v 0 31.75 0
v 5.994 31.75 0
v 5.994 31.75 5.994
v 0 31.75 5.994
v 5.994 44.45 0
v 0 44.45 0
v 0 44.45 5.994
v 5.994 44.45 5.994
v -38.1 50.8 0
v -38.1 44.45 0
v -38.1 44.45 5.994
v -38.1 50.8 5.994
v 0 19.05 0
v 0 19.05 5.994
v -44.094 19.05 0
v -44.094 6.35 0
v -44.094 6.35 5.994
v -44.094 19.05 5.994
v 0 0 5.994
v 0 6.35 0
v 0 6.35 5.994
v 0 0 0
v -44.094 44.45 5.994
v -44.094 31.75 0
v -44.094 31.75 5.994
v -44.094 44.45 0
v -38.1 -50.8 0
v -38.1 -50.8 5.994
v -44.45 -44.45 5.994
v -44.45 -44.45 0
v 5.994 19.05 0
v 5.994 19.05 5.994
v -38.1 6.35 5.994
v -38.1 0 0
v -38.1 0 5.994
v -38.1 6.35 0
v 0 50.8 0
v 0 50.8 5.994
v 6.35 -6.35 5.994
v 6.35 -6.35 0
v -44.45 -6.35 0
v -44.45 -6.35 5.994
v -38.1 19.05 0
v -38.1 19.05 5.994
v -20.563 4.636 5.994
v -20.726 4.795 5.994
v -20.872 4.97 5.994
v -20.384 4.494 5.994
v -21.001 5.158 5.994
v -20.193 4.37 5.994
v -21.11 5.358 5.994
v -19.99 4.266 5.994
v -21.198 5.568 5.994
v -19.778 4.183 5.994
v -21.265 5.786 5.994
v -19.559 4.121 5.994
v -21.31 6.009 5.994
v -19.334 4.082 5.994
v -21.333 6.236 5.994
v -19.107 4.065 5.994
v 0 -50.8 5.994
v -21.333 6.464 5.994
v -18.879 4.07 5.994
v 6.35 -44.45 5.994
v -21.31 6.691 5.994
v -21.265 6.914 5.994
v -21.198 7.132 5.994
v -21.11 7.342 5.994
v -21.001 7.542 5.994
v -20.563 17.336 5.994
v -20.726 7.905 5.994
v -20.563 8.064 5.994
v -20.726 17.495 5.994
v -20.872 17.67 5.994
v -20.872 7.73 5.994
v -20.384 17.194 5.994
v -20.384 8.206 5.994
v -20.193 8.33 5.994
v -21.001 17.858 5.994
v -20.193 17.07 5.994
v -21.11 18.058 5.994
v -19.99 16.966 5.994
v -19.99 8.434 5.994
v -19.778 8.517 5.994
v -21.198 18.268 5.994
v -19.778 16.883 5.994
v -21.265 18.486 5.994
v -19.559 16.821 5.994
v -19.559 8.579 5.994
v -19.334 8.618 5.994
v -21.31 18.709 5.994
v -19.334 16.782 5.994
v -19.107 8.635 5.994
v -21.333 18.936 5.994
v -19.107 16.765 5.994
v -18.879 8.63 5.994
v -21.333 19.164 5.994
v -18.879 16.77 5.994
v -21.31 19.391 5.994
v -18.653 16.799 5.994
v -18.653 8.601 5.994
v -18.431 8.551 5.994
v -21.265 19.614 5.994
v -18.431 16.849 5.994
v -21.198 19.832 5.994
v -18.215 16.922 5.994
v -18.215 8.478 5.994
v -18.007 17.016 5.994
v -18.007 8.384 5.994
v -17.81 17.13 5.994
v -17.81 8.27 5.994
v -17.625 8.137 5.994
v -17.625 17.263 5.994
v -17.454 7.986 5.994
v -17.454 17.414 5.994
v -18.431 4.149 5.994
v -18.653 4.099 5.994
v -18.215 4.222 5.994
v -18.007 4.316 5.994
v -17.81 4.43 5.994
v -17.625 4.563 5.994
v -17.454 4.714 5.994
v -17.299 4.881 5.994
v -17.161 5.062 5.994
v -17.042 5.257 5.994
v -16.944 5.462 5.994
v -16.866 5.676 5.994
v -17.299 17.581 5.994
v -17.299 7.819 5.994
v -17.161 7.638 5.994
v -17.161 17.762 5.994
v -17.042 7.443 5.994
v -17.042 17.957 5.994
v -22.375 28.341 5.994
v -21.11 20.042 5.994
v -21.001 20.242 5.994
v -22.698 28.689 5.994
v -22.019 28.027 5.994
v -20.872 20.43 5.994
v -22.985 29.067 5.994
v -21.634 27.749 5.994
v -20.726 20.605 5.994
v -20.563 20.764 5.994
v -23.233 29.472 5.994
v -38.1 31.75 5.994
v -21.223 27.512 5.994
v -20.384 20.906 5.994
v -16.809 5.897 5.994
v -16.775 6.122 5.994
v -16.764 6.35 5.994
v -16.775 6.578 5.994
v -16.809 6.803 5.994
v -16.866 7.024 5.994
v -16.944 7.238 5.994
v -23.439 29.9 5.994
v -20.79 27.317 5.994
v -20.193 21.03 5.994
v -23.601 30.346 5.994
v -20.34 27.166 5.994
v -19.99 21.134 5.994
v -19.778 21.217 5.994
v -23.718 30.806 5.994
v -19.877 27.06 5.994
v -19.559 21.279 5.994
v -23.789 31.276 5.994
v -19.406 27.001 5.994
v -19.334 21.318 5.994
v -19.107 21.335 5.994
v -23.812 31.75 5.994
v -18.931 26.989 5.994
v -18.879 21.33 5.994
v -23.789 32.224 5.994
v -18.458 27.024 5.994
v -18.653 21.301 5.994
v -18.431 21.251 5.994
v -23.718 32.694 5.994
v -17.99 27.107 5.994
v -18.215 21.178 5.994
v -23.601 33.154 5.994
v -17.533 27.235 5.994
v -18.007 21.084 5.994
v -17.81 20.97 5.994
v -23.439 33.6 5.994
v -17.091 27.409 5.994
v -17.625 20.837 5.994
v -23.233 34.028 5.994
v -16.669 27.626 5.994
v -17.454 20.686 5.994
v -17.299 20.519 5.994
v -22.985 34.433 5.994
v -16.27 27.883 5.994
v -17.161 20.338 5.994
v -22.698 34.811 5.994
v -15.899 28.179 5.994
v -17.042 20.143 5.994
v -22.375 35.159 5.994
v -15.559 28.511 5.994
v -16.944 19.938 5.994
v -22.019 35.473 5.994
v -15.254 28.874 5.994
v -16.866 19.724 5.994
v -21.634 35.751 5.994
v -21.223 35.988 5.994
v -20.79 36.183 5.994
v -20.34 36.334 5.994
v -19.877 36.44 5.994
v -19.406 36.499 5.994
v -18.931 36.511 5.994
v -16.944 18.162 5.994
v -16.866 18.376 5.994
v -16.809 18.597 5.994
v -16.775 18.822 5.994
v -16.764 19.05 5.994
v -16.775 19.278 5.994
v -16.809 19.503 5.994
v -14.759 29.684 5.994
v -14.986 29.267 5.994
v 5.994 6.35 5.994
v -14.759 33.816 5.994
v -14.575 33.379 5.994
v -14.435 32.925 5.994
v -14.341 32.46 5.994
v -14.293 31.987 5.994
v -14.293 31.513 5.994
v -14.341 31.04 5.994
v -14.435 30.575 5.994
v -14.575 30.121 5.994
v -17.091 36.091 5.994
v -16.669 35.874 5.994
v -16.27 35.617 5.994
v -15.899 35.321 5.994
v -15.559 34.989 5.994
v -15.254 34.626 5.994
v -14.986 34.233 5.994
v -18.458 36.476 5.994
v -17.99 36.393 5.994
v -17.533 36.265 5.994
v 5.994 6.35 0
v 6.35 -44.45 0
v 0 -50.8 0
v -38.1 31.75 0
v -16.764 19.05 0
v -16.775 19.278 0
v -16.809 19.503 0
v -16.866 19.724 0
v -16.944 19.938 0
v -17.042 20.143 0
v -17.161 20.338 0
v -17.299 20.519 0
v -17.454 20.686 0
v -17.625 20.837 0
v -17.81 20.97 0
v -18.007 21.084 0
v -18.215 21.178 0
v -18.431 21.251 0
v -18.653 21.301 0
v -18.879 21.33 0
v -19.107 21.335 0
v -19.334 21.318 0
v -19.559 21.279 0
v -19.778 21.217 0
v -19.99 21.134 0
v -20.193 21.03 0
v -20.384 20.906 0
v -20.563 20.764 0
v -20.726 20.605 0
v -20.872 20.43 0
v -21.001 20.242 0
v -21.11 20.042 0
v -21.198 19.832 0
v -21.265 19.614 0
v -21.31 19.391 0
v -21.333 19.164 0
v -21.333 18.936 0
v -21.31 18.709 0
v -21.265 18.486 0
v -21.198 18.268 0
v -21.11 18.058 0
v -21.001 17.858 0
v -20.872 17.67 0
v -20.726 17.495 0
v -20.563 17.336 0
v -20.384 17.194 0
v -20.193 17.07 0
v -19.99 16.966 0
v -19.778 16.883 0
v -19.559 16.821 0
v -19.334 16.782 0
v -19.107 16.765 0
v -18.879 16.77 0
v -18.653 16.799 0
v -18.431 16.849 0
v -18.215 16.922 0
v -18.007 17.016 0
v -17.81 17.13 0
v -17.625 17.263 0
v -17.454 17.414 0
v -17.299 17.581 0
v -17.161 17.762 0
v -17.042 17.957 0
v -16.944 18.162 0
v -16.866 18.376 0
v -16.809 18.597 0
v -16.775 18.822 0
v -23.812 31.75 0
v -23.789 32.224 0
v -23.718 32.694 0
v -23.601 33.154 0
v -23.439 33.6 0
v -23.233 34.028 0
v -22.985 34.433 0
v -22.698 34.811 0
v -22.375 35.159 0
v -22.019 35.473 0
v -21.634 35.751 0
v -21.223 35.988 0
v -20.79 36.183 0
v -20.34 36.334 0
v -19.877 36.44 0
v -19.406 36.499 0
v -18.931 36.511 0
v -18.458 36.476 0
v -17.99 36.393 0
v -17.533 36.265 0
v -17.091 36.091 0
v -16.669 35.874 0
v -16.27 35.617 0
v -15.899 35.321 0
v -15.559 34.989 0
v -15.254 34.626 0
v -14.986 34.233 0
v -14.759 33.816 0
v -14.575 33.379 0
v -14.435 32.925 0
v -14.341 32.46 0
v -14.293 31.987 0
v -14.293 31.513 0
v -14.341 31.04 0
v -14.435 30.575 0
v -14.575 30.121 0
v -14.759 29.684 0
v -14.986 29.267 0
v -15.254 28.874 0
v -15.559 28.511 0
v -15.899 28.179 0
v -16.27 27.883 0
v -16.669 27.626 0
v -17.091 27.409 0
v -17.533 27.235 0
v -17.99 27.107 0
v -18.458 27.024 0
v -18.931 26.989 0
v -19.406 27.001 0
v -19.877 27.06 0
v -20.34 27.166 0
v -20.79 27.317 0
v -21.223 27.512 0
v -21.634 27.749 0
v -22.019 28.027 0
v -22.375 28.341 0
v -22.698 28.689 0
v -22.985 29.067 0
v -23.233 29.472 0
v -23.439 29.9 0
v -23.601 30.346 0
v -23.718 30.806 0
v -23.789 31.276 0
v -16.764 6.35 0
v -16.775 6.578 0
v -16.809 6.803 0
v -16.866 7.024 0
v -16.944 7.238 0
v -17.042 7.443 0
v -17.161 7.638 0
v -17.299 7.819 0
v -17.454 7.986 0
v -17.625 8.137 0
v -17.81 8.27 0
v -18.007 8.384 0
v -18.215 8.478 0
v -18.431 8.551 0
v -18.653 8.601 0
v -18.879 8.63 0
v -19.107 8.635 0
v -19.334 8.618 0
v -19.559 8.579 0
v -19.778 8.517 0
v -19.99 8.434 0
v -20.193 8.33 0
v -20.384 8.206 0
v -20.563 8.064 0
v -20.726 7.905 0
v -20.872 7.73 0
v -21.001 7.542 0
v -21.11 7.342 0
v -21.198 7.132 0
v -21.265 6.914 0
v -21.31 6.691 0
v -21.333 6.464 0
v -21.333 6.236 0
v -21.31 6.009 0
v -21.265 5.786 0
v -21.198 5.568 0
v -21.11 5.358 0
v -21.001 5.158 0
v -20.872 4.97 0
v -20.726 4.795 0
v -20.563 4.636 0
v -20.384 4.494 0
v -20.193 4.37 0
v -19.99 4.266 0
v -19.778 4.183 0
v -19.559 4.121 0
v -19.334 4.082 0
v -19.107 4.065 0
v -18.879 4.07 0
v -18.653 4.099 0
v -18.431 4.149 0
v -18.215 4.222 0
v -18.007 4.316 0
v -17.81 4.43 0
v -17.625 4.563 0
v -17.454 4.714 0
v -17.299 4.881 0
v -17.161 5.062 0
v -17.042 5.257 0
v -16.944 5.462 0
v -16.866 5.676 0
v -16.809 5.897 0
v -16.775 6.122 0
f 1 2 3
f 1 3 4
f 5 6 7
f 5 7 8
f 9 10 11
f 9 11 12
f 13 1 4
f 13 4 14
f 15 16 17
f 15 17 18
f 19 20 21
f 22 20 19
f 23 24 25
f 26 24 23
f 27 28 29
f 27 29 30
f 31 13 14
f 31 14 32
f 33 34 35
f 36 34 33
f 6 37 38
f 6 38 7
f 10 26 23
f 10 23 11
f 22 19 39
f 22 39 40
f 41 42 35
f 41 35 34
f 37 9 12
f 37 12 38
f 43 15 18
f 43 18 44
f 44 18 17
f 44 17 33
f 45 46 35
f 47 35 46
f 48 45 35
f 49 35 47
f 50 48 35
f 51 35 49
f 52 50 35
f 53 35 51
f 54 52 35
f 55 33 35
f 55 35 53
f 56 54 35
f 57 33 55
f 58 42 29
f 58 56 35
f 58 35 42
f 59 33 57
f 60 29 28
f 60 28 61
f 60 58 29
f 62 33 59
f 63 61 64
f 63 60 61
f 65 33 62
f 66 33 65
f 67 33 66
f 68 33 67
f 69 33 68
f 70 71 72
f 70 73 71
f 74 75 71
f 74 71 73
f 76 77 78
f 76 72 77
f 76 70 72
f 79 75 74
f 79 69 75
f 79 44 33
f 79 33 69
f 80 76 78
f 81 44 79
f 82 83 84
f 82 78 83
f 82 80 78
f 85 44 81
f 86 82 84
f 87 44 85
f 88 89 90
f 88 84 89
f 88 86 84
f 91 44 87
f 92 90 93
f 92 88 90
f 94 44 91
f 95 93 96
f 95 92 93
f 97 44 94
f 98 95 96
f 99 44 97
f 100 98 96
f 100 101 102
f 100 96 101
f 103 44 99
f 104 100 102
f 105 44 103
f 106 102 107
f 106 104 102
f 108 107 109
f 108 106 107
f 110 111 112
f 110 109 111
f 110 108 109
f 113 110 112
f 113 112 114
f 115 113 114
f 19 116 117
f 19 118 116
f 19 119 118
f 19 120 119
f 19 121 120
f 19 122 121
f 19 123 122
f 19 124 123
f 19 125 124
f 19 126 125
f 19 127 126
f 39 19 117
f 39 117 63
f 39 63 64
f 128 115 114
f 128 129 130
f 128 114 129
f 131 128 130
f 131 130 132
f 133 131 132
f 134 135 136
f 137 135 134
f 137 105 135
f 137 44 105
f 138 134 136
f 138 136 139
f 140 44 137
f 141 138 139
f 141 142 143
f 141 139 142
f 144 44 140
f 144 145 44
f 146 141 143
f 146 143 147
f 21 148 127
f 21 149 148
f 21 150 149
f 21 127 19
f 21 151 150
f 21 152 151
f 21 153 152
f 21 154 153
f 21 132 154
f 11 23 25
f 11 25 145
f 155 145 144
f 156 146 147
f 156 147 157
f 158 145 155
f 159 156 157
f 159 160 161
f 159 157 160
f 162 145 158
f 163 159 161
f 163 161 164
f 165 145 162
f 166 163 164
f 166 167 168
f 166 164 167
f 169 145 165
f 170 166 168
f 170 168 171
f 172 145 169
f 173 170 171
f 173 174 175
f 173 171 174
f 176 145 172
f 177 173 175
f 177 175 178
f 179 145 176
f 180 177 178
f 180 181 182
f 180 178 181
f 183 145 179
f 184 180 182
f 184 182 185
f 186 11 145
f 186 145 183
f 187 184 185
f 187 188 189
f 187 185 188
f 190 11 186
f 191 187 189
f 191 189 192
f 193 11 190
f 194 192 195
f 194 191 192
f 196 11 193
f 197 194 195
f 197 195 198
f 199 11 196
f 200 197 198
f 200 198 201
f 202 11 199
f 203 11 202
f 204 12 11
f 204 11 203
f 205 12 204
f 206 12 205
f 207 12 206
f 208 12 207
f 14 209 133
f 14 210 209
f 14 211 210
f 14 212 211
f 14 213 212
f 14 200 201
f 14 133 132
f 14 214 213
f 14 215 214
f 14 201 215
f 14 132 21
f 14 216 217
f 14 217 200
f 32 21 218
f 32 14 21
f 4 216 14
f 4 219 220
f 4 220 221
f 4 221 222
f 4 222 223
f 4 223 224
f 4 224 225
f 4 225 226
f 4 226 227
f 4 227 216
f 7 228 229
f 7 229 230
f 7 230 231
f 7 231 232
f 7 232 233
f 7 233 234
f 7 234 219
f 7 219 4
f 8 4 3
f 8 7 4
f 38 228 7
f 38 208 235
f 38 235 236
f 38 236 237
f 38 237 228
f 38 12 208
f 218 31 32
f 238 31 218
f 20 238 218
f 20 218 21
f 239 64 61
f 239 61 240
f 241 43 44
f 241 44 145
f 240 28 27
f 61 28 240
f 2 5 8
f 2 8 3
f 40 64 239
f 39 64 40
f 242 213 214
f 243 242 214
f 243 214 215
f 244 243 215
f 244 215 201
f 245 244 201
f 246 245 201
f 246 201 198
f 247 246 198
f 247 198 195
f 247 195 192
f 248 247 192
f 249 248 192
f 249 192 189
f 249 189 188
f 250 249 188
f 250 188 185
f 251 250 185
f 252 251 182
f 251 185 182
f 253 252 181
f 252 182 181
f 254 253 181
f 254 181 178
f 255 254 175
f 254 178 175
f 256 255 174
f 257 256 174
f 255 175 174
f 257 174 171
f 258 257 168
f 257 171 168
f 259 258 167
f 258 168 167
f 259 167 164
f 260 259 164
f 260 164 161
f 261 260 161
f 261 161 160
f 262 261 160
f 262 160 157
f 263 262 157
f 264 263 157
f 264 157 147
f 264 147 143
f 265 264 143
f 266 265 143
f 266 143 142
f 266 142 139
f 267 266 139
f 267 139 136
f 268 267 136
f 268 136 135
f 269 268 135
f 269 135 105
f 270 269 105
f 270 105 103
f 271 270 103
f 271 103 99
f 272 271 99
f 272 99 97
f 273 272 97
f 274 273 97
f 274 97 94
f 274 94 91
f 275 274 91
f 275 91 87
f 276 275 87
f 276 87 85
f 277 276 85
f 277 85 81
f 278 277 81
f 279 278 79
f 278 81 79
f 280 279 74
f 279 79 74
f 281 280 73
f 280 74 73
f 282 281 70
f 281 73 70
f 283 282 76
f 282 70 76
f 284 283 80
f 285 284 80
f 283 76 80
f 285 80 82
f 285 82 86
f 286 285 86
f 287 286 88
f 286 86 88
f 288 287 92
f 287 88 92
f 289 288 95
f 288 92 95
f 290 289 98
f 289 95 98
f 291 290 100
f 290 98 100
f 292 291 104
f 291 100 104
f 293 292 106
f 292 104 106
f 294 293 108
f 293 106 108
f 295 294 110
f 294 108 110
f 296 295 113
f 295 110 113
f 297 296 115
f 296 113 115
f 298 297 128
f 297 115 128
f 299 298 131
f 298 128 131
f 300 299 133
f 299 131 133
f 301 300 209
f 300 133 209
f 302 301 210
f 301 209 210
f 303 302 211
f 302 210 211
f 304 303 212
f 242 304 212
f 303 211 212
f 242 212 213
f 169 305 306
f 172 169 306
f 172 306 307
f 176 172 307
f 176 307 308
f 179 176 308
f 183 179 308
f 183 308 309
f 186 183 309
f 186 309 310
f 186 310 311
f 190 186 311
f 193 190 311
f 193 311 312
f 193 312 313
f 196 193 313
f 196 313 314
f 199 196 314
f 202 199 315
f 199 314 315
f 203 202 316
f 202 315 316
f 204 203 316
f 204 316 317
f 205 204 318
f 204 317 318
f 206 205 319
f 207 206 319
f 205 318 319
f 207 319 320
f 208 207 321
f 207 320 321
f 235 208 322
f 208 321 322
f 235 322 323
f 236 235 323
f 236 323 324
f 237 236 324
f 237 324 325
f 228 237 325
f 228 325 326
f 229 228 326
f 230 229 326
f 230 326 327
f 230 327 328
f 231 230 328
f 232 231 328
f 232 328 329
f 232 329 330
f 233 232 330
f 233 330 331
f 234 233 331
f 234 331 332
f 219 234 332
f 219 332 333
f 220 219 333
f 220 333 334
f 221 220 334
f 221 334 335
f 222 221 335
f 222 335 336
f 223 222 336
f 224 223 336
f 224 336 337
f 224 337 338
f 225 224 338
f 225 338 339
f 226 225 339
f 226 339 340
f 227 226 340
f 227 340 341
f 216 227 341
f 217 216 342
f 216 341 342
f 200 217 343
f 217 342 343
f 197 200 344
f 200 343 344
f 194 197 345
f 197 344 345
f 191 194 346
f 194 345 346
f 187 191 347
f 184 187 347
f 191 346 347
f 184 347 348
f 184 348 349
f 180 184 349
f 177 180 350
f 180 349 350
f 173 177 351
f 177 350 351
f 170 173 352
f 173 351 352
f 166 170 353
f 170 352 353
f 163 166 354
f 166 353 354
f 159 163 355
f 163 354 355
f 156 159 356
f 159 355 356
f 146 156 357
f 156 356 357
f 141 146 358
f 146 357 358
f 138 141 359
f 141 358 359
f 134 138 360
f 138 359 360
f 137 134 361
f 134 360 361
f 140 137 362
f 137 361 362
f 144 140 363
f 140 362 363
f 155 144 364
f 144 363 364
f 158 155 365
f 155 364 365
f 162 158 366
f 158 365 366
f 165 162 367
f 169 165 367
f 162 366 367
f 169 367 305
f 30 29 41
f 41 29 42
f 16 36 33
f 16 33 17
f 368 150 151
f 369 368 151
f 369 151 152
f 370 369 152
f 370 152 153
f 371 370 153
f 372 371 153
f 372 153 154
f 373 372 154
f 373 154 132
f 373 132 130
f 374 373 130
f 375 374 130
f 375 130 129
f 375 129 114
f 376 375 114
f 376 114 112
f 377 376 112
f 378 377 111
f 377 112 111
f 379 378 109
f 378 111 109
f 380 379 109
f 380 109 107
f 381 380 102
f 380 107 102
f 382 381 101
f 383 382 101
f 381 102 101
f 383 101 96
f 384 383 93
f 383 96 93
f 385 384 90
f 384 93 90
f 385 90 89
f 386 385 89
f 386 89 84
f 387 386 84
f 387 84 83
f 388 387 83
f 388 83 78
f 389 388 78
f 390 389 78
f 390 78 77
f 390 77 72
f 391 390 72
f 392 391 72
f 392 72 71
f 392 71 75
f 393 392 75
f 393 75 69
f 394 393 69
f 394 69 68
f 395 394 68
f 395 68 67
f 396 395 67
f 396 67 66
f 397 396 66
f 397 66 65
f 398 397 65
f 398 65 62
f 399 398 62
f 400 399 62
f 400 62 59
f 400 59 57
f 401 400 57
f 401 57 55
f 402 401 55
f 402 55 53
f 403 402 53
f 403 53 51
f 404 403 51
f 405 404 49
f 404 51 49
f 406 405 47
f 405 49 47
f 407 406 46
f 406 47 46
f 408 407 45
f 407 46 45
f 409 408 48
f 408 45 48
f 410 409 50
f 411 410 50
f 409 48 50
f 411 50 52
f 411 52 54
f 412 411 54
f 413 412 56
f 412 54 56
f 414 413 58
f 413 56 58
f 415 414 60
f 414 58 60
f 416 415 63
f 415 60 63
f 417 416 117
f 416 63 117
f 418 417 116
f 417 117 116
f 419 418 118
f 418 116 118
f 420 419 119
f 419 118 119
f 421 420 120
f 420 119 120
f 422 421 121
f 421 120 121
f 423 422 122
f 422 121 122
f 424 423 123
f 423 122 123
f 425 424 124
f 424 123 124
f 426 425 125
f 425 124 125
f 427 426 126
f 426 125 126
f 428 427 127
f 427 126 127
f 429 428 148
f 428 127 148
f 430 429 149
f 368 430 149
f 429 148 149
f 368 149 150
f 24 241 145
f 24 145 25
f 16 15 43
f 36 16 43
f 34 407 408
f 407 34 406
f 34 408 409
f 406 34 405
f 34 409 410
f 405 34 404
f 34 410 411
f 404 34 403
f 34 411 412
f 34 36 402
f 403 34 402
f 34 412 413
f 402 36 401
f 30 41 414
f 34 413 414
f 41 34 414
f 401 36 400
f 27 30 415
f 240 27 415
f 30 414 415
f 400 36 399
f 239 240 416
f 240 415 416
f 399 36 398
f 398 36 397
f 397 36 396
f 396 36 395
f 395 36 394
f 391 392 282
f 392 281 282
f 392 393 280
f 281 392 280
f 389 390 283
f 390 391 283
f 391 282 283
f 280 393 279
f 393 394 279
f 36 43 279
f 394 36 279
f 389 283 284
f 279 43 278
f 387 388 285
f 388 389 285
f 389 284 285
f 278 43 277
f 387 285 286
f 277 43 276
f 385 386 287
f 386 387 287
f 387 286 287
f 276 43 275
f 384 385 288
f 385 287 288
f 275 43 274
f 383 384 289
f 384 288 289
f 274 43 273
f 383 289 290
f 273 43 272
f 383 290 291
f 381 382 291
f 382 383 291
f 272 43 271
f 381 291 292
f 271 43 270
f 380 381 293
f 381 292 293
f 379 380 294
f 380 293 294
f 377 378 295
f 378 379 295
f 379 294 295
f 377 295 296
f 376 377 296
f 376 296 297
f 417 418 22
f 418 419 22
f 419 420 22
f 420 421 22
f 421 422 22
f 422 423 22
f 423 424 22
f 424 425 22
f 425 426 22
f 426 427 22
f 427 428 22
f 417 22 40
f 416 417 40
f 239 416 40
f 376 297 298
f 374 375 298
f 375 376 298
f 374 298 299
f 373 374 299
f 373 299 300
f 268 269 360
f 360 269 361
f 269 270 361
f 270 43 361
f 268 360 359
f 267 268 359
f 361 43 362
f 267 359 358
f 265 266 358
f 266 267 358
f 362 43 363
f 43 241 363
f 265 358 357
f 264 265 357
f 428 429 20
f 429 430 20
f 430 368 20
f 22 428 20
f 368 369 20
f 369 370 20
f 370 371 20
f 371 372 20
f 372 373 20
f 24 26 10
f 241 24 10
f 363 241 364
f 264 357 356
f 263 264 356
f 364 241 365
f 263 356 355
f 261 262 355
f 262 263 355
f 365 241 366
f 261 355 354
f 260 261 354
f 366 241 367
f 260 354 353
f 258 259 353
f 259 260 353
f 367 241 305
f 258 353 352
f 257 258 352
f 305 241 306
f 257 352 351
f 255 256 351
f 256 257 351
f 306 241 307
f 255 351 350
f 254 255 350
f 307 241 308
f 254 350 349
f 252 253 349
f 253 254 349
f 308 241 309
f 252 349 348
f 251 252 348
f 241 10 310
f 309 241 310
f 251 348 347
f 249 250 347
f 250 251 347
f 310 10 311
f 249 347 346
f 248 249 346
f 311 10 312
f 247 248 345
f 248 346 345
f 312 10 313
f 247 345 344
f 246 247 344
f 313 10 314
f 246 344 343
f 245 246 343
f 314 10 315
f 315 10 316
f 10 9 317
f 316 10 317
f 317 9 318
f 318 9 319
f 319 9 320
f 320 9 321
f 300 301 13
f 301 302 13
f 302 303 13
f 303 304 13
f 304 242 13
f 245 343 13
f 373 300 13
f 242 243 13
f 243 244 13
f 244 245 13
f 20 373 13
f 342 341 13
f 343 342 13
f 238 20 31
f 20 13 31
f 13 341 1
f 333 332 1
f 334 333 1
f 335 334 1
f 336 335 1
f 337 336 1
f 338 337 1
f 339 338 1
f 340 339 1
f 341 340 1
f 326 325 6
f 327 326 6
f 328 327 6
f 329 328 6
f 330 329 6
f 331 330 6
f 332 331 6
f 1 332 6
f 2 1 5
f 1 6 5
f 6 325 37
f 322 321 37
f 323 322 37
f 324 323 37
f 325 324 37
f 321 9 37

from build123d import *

# Parameters (mm, degrees)
BOSS_EXTRUDE1_DEPTH = 5.9944
SKETCH2_R           = 4.7625
CUT_EXTRUDE1_DEPTH  = 68.534353797
SKETCH3_R           = 2.286
CUT_EXTRUDE2_DEPTH  = 68.534353797
SKETCH4_W           = 50.8
SKETCH4_H           = 50.8
BOSS_EXTRUDE2_DEPTH = 5.9944
CHAMFER1_SIZE       = 6.35


with BuildPart() as part:
    # Sketch1 → Boss-Extrude1 (new body)
    with BuildSketch(Plane.XY):
        Polygon((0, 0), (-38.1, 0), (-38.1, 6.35), (-44.0944, 6.35), (-44.0944, 19.05), (-38.1, 19.05), (-38.1, 31.75), (-44.0944, 31.75), (-44.0944, 44.45), (-38.1, 44.45), (-38.1, 50.8), (0, 50.8), (0, 44.45), (5.9944, 44.45), (5.9944, 31.75), (0, 31.75), (0, 19.05), (5.9944, 19.05), (5.9944, 6.35), (0, 6.35), align=None)
    extrude(amount=BOSS_EXTRUDE1_DEPTH)

    # Sketch2 → Cut-Extrude1 (cut, through all)
    with BuildSketch(Plane(origin=(0, 0, 0), x_dir=(-1, 0, 0), z_dir=(0, 0, -1))):
        with Locations((19.05, 31.75)):
            Circle(SKETCH2_R)
    extrude(amount=-CUT_EXTRUDE1_DEPTH, mode=Mode.SUBTRACT)

    # Sketch3 → Cut-Extrude2 (cut, through all)
    with BuildSketch(Plane.XY.offset(5.9944)):
        with Locations((-19.05, 19.05)):
            Circle(SKETCH3_R)
        with Locations((-19.05, 6.35)):
            Circle(SKETCH3_R)
    extrude(amount=-CUT_EXTRUDE2_DEPTH, mode=Mode.SUBTRACT)

    # Sketch4 → Boss-Extrude2 (add)
    with BuildSketch(Plane.XY.offset(5.9944)):
        with Locations((-19.05, -25.4)):
            Rectangle(SKETCH4_W, SKETCH4_H)
    extrude(amount=-BOSS_EXTRUDE2_DEPTH)

    # Chamfer1
    chamfer1_edges = [part.edges().sort_by_distance(p)[0] for p in [
        (6.35, 0, 2.9972),
        (6.35, -50.8, 2.9972),
        (-44.45, -50.8, 2.9972),
        (-44.45, 0, 2.9972),
    ]]
    chamfer(chamfer1_edges, length=CHAMFER1_SIZE - 0.0001)  # a hair under: the kernel refuses the full size


solid = part.part
